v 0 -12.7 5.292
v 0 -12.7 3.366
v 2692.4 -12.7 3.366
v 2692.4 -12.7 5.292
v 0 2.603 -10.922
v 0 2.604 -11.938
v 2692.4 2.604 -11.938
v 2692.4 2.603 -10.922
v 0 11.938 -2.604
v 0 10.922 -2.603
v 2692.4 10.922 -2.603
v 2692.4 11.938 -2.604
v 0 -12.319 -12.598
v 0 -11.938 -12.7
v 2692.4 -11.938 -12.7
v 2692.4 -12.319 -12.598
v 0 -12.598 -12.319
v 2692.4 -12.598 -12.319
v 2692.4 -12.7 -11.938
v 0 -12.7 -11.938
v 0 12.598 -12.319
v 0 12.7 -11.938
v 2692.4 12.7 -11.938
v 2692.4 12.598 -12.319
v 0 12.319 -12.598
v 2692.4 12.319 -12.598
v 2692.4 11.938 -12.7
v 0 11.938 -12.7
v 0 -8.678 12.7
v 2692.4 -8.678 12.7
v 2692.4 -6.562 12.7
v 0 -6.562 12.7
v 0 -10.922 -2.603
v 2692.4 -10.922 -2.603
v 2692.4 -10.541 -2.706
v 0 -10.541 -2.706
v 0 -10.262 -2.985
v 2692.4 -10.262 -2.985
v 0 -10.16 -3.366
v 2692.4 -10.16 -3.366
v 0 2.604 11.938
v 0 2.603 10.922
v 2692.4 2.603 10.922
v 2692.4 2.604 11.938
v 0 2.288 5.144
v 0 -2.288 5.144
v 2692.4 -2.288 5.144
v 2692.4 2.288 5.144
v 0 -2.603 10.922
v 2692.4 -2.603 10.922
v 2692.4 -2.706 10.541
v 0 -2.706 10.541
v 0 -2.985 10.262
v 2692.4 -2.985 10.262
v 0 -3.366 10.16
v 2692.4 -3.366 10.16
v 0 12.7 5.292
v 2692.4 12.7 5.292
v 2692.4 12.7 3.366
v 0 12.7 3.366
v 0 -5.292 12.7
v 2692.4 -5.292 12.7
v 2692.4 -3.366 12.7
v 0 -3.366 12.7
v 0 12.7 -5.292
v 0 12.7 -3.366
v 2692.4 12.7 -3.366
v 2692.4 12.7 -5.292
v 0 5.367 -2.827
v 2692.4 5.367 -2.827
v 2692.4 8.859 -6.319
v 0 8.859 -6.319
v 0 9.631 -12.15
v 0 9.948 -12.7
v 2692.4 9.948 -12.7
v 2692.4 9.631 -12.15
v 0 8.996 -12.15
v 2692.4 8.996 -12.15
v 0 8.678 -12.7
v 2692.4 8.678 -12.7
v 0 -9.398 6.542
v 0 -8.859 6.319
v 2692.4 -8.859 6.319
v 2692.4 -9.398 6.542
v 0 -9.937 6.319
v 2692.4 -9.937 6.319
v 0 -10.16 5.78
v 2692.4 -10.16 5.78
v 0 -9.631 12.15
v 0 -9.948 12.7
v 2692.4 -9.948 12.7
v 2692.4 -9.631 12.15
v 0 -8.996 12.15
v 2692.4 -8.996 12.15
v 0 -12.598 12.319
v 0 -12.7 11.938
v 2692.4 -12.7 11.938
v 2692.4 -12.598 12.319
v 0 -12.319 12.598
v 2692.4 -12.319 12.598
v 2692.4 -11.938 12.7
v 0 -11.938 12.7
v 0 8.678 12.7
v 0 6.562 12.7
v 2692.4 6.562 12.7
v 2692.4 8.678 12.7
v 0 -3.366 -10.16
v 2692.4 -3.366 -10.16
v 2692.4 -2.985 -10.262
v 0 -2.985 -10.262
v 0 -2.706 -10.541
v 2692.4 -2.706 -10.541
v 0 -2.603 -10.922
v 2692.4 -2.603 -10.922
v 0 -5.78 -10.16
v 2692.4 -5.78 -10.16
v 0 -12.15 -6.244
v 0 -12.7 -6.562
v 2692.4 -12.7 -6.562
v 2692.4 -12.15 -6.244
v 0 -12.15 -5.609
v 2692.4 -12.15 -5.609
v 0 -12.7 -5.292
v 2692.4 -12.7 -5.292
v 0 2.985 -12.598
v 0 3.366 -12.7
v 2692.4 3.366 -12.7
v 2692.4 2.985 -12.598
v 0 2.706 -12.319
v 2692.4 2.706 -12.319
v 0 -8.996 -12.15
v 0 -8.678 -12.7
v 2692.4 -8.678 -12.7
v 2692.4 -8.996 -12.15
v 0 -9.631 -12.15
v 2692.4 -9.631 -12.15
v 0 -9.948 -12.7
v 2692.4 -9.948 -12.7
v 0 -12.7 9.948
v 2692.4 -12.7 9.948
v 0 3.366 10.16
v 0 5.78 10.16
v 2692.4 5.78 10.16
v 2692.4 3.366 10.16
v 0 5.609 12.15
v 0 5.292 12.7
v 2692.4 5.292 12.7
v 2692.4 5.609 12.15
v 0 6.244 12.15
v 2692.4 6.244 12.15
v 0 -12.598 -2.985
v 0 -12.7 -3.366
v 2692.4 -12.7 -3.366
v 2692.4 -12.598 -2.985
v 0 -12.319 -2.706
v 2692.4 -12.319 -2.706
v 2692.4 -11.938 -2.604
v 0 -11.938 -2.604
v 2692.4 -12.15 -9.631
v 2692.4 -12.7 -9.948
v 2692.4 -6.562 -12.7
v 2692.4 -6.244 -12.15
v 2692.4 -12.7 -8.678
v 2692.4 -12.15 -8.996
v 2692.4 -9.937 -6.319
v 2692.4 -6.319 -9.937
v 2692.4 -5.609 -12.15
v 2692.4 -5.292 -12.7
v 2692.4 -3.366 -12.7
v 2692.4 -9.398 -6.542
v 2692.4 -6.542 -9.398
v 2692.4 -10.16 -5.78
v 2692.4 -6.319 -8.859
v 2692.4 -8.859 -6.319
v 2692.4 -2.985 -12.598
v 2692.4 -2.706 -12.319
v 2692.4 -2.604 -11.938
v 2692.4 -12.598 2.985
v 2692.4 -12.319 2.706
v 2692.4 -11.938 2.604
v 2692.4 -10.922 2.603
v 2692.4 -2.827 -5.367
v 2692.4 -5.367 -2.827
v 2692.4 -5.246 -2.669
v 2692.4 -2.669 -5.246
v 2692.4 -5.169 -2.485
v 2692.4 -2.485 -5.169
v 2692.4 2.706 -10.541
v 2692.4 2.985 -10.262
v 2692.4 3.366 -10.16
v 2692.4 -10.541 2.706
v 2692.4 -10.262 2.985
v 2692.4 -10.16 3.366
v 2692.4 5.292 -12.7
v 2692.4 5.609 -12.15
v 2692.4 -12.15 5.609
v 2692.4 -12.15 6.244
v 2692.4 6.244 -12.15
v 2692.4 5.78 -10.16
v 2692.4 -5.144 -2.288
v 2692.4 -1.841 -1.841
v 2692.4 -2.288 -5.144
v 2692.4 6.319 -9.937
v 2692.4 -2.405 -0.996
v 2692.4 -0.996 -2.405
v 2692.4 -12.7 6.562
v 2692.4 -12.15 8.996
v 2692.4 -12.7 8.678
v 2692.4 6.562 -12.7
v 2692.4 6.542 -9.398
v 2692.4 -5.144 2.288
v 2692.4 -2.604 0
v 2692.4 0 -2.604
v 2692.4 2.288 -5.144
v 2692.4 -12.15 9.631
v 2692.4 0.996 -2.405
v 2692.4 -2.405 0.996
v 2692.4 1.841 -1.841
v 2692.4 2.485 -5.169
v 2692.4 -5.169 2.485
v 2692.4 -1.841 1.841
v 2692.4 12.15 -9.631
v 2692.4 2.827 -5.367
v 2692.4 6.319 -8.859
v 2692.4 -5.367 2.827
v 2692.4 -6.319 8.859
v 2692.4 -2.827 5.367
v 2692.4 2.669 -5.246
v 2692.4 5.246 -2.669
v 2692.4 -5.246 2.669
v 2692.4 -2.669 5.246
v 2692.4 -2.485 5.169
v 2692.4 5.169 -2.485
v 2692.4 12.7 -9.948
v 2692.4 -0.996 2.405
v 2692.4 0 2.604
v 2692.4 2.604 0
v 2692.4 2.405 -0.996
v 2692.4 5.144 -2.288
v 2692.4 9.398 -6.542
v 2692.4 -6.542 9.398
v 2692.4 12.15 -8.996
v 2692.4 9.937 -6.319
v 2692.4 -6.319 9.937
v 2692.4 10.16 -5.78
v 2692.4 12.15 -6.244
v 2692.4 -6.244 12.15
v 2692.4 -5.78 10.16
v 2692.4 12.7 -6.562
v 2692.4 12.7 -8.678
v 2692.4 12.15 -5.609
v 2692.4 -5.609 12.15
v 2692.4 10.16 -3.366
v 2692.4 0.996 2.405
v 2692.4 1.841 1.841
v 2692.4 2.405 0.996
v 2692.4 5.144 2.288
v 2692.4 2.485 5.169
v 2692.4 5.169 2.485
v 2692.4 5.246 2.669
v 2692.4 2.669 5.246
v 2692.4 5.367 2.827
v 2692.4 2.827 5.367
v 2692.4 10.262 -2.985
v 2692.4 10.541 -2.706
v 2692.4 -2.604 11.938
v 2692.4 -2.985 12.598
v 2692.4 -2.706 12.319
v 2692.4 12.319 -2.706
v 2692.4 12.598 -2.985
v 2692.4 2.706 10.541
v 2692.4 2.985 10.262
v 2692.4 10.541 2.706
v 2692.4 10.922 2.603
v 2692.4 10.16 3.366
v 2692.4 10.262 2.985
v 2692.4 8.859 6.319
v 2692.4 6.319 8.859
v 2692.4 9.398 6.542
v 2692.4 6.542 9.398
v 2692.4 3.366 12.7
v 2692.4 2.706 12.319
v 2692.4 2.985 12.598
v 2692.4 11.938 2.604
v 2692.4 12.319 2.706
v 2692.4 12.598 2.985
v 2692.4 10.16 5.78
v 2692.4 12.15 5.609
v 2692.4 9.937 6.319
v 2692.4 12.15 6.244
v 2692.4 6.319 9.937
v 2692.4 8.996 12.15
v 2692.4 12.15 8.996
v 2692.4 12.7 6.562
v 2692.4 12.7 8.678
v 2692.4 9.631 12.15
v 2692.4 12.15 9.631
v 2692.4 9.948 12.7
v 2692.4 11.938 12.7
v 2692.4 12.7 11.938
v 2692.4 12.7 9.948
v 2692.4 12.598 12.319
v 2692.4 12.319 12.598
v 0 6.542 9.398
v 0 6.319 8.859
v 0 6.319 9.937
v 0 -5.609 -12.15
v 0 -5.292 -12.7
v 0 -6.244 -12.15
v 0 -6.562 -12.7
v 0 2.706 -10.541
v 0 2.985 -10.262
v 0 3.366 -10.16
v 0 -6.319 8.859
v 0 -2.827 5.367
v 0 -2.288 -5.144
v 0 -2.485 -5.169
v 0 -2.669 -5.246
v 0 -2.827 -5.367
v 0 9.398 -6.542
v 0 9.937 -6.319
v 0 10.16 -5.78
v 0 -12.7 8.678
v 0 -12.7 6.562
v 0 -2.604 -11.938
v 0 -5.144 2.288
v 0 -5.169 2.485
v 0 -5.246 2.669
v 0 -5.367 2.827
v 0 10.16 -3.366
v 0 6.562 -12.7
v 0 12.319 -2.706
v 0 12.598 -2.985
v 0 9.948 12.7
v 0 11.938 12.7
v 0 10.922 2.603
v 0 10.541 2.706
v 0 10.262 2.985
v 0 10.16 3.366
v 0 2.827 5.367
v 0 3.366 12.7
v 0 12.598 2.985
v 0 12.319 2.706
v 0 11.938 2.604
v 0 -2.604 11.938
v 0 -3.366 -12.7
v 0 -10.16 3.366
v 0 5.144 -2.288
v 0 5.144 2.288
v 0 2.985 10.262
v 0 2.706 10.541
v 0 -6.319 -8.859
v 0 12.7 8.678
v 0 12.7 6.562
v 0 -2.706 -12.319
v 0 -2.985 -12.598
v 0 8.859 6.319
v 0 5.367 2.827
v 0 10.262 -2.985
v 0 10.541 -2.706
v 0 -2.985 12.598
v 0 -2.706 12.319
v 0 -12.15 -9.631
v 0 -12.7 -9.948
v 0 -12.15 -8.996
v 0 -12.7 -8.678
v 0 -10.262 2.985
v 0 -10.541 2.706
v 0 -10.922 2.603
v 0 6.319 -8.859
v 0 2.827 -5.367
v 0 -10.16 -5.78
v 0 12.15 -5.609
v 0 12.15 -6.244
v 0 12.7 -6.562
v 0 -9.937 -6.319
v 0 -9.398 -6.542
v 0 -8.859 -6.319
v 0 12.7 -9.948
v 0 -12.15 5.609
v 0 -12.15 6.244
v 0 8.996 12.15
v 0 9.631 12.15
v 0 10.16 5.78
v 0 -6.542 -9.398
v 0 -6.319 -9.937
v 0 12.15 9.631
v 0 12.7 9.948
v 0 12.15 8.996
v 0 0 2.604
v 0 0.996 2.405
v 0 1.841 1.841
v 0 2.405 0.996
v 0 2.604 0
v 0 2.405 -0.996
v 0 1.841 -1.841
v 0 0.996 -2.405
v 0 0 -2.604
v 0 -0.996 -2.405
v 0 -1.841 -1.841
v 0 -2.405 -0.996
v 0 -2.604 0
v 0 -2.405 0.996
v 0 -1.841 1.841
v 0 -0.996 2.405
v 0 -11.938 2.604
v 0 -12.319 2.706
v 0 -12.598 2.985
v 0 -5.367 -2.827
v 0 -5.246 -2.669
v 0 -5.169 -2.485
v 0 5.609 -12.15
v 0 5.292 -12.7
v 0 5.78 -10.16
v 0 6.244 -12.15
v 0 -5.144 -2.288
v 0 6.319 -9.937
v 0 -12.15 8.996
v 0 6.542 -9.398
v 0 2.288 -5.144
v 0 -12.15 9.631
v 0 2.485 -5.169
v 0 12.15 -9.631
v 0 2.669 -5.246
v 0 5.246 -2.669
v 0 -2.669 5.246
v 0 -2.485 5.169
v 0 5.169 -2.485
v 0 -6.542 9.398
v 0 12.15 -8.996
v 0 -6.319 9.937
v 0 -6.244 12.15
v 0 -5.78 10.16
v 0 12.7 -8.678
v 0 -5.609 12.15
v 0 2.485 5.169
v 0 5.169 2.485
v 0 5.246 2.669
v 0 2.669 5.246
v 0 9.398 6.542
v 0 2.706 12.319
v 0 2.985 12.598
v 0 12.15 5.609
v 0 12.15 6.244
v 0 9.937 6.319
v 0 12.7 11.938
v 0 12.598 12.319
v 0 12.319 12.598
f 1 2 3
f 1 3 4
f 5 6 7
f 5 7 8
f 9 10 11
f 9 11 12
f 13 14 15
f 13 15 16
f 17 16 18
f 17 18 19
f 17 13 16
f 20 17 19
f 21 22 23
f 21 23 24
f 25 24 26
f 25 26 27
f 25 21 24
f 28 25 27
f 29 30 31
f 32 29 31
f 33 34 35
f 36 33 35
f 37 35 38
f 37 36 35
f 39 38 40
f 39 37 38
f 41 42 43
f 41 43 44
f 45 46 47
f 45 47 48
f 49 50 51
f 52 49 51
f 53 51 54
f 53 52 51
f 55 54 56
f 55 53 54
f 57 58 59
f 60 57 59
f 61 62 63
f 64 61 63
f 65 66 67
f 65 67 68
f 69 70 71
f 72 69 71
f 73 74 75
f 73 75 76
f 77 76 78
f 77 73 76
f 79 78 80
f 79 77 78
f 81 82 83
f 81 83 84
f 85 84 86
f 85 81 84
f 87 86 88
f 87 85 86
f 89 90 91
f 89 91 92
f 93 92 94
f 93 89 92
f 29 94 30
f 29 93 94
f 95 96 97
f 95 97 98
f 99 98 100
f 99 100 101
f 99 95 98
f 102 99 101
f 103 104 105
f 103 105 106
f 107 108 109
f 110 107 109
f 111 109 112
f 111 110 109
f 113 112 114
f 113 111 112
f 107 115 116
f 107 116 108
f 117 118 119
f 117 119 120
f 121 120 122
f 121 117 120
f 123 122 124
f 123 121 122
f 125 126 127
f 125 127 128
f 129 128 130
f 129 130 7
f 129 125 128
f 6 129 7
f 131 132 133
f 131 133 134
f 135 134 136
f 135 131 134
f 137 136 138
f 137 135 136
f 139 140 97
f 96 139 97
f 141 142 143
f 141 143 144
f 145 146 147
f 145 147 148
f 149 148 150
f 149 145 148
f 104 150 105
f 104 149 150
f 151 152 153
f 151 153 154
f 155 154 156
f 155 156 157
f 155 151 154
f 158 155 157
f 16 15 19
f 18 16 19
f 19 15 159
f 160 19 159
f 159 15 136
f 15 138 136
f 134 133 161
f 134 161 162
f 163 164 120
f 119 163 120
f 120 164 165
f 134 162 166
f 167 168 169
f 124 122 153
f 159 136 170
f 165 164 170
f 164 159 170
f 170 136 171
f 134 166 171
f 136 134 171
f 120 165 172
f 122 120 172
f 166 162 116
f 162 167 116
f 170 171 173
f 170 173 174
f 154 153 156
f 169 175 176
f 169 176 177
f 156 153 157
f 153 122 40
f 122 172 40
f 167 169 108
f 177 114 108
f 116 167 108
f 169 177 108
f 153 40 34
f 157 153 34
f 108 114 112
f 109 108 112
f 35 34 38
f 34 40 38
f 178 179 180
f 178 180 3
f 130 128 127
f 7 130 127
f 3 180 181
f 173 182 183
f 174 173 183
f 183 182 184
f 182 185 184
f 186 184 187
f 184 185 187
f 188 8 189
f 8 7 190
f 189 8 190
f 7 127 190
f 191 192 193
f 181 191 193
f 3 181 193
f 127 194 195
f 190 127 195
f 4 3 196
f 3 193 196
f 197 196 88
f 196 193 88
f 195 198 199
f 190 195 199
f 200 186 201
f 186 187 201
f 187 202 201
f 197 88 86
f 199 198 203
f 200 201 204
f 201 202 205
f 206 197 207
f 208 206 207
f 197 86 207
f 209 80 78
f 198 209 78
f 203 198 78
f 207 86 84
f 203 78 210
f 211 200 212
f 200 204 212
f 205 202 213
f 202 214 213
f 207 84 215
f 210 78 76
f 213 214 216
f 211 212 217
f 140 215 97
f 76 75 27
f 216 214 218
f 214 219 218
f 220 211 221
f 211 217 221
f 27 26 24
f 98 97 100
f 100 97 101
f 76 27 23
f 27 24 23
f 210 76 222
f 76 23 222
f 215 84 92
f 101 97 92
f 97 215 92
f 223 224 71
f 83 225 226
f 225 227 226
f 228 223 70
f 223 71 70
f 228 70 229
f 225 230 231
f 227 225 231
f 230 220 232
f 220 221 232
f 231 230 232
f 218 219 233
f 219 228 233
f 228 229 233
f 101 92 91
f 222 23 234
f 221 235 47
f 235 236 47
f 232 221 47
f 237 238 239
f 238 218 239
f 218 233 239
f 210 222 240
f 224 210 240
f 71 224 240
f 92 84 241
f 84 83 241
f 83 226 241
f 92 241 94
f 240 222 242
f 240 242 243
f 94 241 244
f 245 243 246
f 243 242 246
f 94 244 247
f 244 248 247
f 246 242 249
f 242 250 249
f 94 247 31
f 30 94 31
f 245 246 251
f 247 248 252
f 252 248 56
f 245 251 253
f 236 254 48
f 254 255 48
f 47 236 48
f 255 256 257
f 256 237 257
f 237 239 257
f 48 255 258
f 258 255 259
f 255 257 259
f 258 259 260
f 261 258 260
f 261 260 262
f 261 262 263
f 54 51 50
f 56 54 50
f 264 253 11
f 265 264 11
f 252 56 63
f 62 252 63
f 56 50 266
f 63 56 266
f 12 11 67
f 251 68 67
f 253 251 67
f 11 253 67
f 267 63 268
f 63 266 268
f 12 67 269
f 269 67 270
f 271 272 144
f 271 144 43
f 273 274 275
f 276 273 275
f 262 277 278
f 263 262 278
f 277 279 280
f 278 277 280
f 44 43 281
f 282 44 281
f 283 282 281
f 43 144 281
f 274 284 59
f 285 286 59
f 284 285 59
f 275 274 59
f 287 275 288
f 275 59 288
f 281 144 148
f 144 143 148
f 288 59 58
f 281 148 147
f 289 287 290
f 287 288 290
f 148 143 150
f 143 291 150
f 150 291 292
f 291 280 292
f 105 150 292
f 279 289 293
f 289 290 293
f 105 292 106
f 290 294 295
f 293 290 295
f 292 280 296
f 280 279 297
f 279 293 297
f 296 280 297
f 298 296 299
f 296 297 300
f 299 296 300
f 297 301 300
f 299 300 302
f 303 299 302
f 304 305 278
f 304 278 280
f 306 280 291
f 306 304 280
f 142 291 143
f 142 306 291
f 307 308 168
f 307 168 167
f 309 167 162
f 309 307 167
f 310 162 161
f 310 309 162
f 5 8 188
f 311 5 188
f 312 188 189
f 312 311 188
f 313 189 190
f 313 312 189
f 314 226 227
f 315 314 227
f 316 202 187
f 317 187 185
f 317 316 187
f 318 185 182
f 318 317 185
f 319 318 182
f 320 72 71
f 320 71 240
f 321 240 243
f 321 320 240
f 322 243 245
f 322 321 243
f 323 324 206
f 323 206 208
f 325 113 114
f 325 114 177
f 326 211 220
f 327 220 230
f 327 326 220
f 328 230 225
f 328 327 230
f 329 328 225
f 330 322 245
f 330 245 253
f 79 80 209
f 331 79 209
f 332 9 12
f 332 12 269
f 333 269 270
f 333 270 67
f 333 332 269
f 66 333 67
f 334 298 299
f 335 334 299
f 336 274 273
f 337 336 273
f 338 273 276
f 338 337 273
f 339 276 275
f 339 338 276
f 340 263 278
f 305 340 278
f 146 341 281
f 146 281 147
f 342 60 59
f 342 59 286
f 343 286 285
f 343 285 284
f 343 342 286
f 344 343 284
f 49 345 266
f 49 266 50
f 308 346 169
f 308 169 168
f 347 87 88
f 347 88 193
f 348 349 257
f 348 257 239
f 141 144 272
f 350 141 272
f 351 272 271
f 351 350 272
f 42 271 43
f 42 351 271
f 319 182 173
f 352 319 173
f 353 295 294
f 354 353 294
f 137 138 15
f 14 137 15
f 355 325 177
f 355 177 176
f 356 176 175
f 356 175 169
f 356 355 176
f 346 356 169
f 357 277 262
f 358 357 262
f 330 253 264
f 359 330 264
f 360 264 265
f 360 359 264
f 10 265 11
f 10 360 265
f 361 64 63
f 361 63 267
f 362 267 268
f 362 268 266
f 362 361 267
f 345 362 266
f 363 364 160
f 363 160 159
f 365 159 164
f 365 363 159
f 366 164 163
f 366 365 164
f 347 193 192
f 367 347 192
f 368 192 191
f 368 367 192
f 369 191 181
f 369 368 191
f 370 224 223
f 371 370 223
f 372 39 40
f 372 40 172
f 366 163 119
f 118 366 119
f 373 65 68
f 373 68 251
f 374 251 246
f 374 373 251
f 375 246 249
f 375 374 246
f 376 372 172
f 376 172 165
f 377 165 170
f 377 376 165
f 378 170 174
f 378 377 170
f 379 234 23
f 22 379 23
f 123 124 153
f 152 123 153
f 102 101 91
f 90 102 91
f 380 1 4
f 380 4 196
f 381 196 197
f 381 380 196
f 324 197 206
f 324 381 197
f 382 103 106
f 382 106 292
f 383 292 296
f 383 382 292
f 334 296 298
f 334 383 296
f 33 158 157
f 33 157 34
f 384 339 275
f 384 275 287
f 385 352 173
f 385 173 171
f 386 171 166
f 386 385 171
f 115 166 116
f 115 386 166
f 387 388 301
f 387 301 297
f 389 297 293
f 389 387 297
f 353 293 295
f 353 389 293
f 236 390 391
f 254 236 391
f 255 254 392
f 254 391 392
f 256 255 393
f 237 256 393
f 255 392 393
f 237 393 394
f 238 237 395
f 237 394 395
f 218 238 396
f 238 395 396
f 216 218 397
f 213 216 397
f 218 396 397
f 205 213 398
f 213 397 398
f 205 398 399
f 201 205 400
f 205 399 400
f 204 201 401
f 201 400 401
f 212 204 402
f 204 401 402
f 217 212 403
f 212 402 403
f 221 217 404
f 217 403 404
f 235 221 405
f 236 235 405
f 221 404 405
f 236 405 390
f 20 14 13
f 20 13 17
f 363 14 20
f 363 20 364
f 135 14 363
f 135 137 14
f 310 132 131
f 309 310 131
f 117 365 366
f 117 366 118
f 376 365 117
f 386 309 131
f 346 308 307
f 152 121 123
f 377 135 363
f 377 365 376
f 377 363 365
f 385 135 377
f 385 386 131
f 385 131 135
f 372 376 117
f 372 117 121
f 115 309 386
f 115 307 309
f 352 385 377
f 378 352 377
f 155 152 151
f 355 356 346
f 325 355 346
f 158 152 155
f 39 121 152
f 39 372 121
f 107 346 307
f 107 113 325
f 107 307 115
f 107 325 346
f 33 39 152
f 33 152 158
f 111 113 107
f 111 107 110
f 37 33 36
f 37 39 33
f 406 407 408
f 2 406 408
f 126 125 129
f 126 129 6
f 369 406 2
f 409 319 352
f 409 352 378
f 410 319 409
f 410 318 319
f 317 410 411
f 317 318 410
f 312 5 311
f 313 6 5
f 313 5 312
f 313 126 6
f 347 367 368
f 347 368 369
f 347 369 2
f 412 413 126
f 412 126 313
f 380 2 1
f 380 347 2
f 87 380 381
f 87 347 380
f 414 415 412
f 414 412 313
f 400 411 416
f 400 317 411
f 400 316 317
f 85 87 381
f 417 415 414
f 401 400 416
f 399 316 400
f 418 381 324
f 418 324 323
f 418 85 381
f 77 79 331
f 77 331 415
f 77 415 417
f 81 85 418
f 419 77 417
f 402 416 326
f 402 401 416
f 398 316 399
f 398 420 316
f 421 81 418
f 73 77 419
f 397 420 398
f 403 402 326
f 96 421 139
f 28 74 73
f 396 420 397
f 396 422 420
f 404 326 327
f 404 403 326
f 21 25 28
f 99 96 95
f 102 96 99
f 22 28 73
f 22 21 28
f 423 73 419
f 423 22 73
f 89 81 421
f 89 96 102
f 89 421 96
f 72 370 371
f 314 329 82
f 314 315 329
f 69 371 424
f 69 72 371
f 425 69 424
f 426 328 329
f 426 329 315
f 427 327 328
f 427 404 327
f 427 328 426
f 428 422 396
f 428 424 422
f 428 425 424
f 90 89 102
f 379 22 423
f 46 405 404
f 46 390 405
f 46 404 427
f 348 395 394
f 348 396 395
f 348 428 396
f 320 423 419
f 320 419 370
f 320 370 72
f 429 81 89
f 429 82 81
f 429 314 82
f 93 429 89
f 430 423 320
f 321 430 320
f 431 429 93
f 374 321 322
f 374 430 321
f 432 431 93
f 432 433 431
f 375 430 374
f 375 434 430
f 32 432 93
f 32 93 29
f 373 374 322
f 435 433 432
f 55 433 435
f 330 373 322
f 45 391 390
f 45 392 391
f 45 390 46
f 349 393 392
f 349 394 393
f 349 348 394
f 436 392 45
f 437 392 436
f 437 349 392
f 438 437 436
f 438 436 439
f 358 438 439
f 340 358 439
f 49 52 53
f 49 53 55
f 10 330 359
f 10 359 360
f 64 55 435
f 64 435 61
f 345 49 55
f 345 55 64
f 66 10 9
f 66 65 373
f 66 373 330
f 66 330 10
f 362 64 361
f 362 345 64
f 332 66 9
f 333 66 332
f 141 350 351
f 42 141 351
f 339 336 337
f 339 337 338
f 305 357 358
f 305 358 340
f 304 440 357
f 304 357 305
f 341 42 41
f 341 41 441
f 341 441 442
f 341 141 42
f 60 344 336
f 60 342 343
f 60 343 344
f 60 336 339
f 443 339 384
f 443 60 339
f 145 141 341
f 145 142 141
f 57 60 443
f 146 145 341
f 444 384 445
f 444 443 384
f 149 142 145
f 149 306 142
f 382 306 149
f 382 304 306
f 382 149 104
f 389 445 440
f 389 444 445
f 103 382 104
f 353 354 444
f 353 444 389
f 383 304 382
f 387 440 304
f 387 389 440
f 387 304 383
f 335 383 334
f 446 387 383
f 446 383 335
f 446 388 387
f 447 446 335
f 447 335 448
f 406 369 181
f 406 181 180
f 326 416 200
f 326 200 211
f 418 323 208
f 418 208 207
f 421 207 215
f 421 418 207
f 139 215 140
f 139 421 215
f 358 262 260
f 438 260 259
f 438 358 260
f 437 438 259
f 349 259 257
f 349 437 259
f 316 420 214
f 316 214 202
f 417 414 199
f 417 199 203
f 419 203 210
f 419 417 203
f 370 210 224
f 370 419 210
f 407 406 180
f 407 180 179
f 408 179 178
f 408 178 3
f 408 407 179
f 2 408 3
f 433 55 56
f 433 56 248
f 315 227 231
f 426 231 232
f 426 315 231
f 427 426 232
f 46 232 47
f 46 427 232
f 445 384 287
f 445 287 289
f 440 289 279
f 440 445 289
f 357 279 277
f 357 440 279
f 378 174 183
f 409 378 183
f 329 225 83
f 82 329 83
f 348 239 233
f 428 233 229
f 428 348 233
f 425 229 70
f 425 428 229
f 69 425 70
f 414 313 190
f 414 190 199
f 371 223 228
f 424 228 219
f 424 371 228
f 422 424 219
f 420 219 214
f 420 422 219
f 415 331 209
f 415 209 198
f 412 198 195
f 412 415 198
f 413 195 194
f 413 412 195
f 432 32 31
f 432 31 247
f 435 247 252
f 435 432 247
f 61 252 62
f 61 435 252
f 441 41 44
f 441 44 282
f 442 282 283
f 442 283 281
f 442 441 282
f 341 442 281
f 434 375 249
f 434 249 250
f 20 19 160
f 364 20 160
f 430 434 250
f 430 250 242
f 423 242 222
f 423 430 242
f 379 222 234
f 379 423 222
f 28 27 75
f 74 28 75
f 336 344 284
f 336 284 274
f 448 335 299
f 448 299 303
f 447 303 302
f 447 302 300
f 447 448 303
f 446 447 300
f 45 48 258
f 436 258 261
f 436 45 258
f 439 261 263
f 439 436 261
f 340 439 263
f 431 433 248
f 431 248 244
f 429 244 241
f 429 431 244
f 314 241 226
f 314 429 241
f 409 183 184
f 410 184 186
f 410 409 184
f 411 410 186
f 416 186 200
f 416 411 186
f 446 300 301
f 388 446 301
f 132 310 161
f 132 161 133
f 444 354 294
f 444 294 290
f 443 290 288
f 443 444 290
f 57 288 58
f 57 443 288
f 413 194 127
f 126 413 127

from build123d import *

# Parameters (mm, degrees)
BOSS_EXTRUDE1_DEPTH = 2692.4
SKETCH2_R           = 2.6035
CUT_EXTRUDE1_DEPTH  = 2692.4


with BuildPart() as part:
    # Sketch1 → Boss-Extrude1 (new body)
    with BuildSketch(Plane(origin=(0, 0, 0), x_dir=(0, 0, -1), z_dir=(1, 0, 0))):
        with BuildLine():
            Line((-2.6035, 11.938), (-2.6035, 10.922))
            ThreePointArc((-2.6035, 10.922), (-2.826684633, 10.383184633), (-3.3655, 10.16))
            Line((-3.3655, 10.16), (-5.780369265, 10.16))
            ThreePointArc((-5.780369265, 10.16), (-6.484365469, 9.689604775), (-6.319184633, 8.859184633))
            Line((-6.319184633, 8.859184633), (-2.826684633, 5.366684633))
            ThreePointArc((-2.826684633, 5.366684633), (-2.579474041, 5.201503796), (-2.287869265, 5.1435))
            Line((-2.287869265, 5.1435), (2.287869265, 5.1435))
            ThreePointArc((2.287869265, 5.1435), (2.579474041, 5.201503796), (2.826684633, 5.366684633))
            Line((2.826684633, 5.366684633), (6.319184633, 8.859184633))
            ThreePointArc((6.319184633, 8.859184633), (6.484365469, 9.689604775), (5.780369265, 10.16))
            Line((5.780369265, 10.16), (3.3655, 10.16))
            ThreePointArc((3.3655, 10.16), (2.826684633, 10.383184633), (2.6035, 10.922))
            Line((2.6035, 10.922), (2.6035, 11.938))
            ThreePointArc((2.6035, 11.938), (2.826684633, 12.476815367), (3.3655, 12.7))
            Line((3.3655, 12.7), (5.2917598, 12.7))
            ThreePointArc((5.2917598, 12.7), (5.9267598, 12.065), (6.5617598, 12.7))
            Line((6.5617598, 12.7), (8.6783418, 12.7))
            ThreePointArc((8.6783418, 12.7), (9.3133418, 12.065), (9.9483418, 12.7))
            Line((9.9483418, 12.7), (11.938, 12.7))
            ThreePointArc((11.938, 12.7), (12.476815367, 12.476815367), (12.7, 11.938))
            Line((12.7, 11.938), (12.7, 9.9483418))
            ThreePointArc((12.7, 9.9483418), (12.065, 9.3133418), (12.7, 8.6783418))
            Line((12.7, 8.6783418), (12.7, 6.5616836))
            ThreePointArc((12.7, 6.5616836), (12.065, 5.9266836), (12.7, 5.2916836))
            Line((12.7, 5.2916836), (12.7, 3.3655))
            ThreePointArc((12.7, 3.3655), (12.476815367, 2.826684633), (11.938, 2.6035))
            Line((11.938, 2.6035), (10.922, 2.6035))
            ThreePointArc((10.922, 2.6035), (10.383184633, 2.826684633), (10.16, 3.3655))
            Line((10.16, 3.3655), (10.16, 5.780369265))
            ThreePointArc((10.16, 5.780369265), (9.689604775, 6.484365469), (8.859184633, 6.319184633))
            Line((8.859184633, 6.319184633), (5.366684633, 2.826684633))
            ThreePointArc((5.366684633, 2.826684633), (5.201503796, 2.579474041), (5.1435, 2.287869265))
            Line((5.1435, 2.287869265), (5.1435, -2.287869265))
            ThreePointArc((5.1435, -2.287869265), (5.201503796, -2.579474041), (5.366684633, -2.826684633))
            Line((5.366684633, -2.826684633), (8.859184633, -6.319184633))
            ThreePointArc((8.859184633, -6.319184633), (9.689604775, -6.484365469), (10.16, -5.780369265))
            Line((10.16, -5.780369265), (10.16, -3.3655))
            ThreePointArc((10.16, -3.3655), (10.383184633, -2.826684633), (10.922, -2.6035))
            Line((10.922, -2.6035), (11.938, -2.6035))
            ThreePointArc((11.938, -2.6035), (12.476815367, -2.826684633), (12.7, -3.3655))
            Line((12.7, -3.3655), (12.7, -5.2917598))
            ThreePointArc((12.7, -5.2917598), (12.065, -5.9267598), (12.7, -6.5617598))
            Line((12.7, -6.5617598), (12.7, -8.6783418))
            ThreePointArc((12.7, -8.6783418), (12.065, -9.3133418), (12.7, -9.9483418))
            Line((12.7, -9.9483418), (12.7, -11.938))
            ThreePointArc((12.7, -11.938), (12.476815367, -12.476815367), (11.938, -12.7))
            Line((11.938, -12.7), (9.9483418, -12.7))
            ThreePointArc((9.9483418, -12.7), (9.3133418, -12.065), (8.6783418, -12.7))
            Line((8.6783418, -12.7), (6.5616836, -12.7))
            ThreePointArc((6.5616836, -12.7), (5.9266836, -12.065), (5.2916836, -12.7))
            Line((5.2916836, -12.7), (3.3655, -12.7))
            ThreePointArc((3.3655, -12.7), (2.826684633, -12.476815367), (2.6035, -11.938))
            Line((2.6035, -11.938), (2.6035, -10.922))
            ThreePointArc((2.6035, -10.922), (2.826684633, -10.383184633), (3.3655, -10.16))
            Line((3.3655, -10.16), (5.780369265, -10.16))
            ThreePointArc((5.780369265, -10.16), (6.484365469, -9.689604775), (6.319184633, -8.859184633))
            Line((6.319184633, -8.859184633), (2.826684633, -5.366684633))
            ThreePointArc((2.826684633, -5.366684633), (2.579474041, -5.201503796), (2.287869265, -5.1435))
            Line((2.287869265, -5.1435), (-2.287869265, -5.1435))
            ThreePointArc((-2.287869265, -5.1435), (-2.579474041, -5.201503796), (-2.826684633, -5.366684633))
            Line((-2.826684633, -5.366684633), (-6.319184633, -8.859184633))
            ThreePointArc((-6.319184633, -8.859184633), (-6.484365469, -9.689604775), (-5.780369265, -10.16))
            Line((-5.780369265, -10.16), (-3.3655, -10.16))
            ThreePointArc((-3.3655, -10.16), (-2.826684633, -10.383184633), (-2.6035, -10.922))
            Line((-2.6035, -10.922), (-2.6035, -11.938))
            ThreePointArc((-2.6035, -11.938), (-2.826684633, -12.476815367), (-3.3655, -12.7))
            Line((-3.3655, -12.7), (-5.2917598, -12.7))
            ThreePointArc((-5.2917598, -12.7), (-5.9267598, -12.065), (-6.5617598, -12.7))
            Line((-6.5617598, -12.7), (-8.6783418, -12.7))
            ThreePointArc((-8.6783418, -12.7), (-9.3133418, -12.065), (-9.9483418, -12.7))
            Line((-9.9483418, -12.7), (-11.938, -12.7))
            ThreePointArc((-11.938, -12.7), (-12.476815367, -12.476815367), (-12.7, -11.938))
            Line((-12.7, -11.938), (-12.7, -9.9483418))
            ThreePointArc((-12.7, -9.9483418), (-12.065, -9.3133418), (-12.7, -8.6783418))
            Line((-12.7, -8.6783418), (-12.7, -6.5616836))
            ThreePointArc((-12.7, -6.5616836), (-12.065, -5.9266836), (-12.7, -5.2916836))
            Line((-12.7, -5.2916836), (-12.7, -3.3655))
            ThreePointArc((-12.7, -3.3655), (-12.476815367, -2.826684633), (-11.938, -2.6035))
            Line((-11.938, -2.6035), (-10.922, -2.6035))
            ThreePointArc((-10.922, -2.6035), (-10.383184633, -2.826684633), (-10.16, -3.3655))
            Line((-10.16, -3.3655), (-10.16, -5.780369265))
            ThreePointArc((-10.16, -5.780369265), (-9.689604775, -6.484365469), (-8.859184633, -6.319184633))
            Line((-8.859184633, -6.319184633), (-5.366684633, -2.826684633))
            ThreePointArc((-5.366684633, -2.826684633), (-5.201503796, -2.579474041), (-5.1435, -2.287869265))
            Line((-5.1435, -2.287869265), (-5.1435, 2.287869265))
            ThreePointArc((-5.1435, 2.287869265), (-5.201503796, 2.579474041), (-5.366684633, 2.826684633))
            Line((-5.366684633, 2.826684633), (-8.859184633, 6.319184633))
            ThreePointArc((-8.859184633, 6.319184633), (-9.689604775, 6.484365469), (-10.16, 5.780369265))
            Line((-10.16, 5.780369265), (-10.16, 3.3655))
            ThreePointArc((-10.16, 3.3655), (-10.383184633, 2.826684633), (-10.922, 2.6035))
            Line((-10.922, 2.6035), (-11.938, 2.6035))
            ThreePointArc((-11.938, 2.6035), (-12.476815367, 2.826684633), (-12.7, 3.3655))
            Line((-12.7, 3.3655), (-12.7, 5.2917598))
            ThreePointArc((-12.7, 5.2917598), (-12.065, 5.9267598), (-12.7, 6.5617598))
            Line((-12.7, 6.5617598), (-12.7, 8.6783418))
            ThreePointArc((-12.7, 8.6783418), (-12.065, 9.3133418), (-12.7, 9.9483418))
            Line((-12.7, 9.9483418), (-12.7, 11.938))
            ThreePointArc((-12.7, 11.938), (-12.476815367, 12.476815367), (-11.938, 12.7))
            Line((-11.938, 12.7), (-9.9483418, 12.7))
            ThreePointArc((-9.9483418, 12.7), (-9.3133418, 12.065), (-8.6783418, 12.7))
            Line((-8.6783418, 12.7), (-6.5616836, 12.7))
            ThreePointArc((-6.5616836, 12.7), (-5.9266836, 12.065), (-5.2916836, 12.7))
            Line((-5.2916836, 12.7), (-3.3655, 12.7))
            ThreePointArc((-3.3655, 12.7), (-2.826684633, 12.476815367), (-2.6035, 11.938))
        make_face()
    extrude(amount=BOSS_EXTRUDE1_DEPTH)

    # Sketch2 → Cut-Extrude1 (cut)
    with BuildSketch(Plane.ZY):
        Circle(SKETCH2_R)
    extrude(amount=-CUT_EXTRUDE1_DEPTH, mode=Mode.SUBTRACT)


solid = part.part
